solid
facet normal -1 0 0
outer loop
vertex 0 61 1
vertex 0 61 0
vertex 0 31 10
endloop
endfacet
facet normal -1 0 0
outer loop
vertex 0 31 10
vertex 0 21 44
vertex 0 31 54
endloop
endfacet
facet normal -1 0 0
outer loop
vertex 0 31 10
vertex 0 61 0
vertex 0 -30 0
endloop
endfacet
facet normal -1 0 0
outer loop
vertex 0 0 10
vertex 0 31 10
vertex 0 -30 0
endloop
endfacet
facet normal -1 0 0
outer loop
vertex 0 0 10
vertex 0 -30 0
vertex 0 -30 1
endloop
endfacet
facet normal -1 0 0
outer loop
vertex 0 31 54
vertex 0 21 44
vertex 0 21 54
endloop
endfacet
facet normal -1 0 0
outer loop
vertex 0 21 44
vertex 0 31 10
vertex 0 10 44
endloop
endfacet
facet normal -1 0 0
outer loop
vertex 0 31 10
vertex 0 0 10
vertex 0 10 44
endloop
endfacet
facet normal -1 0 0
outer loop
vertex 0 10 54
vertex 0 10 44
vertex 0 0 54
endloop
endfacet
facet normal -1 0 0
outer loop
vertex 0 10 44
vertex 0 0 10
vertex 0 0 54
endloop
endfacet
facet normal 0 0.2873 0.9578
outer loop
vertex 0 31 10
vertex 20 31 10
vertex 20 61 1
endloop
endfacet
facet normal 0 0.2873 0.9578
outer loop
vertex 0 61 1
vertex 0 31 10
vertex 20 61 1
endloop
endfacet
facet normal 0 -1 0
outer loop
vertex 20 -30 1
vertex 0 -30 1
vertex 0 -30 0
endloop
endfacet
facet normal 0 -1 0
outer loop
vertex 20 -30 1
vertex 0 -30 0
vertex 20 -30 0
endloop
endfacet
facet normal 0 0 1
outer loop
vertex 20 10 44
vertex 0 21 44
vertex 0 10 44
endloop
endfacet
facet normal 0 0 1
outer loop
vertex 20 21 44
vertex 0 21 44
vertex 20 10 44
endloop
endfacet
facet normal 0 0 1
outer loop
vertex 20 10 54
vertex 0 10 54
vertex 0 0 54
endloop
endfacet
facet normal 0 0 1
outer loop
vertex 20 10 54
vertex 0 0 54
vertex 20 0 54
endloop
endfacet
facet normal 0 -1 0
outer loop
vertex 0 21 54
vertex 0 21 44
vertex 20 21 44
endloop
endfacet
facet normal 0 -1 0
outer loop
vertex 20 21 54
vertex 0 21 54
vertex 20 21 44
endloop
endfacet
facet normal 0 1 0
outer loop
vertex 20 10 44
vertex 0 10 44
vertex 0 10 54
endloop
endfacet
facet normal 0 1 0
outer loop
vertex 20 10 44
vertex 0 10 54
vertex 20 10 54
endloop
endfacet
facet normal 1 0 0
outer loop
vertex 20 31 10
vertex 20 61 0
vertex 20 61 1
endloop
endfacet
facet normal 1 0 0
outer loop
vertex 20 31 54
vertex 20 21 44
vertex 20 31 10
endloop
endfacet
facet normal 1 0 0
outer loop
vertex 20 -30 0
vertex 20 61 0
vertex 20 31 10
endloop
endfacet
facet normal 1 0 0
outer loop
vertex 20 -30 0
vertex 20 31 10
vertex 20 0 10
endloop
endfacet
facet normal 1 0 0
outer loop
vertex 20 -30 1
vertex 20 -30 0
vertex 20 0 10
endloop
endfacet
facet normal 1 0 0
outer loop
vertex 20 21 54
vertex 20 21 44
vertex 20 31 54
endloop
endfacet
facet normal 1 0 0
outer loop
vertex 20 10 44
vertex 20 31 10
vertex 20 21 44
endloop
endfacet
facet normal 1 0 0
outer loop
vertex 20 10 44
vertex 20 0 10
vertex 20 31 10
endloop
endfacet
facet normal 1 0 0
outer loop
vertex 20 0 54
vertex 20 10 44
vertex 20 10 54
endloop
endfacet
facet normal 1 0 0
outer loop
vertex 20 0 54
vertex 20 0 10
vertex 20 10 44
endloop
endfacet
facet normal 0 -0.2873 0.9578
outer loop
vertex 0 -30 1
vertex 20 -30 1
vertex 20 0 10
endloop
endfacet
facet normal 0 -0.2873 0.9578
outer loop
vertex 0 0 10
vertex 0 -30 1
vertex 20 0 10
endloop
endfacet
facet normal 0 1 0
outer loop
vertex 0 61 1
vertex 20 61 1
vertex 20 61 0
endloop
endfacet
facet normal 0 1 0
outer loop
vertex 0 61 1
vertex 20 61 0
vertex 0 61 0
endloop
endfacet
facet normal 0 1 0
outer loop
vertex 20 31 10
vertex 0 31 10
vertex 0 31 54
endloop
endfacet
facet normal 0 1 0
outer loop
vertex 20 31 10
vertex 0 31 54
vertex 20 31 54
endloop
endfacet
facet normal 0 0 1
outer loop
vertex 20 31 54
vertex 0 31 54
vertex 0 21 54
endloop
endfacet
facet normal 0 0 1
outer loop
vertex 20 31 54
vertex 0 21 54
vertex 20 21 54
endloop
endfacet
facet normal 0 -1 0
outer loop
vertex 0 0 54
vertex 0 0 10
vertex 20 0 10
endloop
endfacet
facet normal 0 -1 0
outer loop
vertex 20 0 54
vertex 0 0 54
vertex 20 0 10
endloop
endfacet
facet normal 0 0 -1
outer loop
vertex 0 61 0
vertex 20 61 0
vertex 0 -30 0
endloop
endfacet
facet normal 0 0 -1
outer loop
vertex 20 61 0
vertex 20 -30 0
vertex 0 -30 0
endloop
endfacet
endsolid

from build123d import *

# Parameters (mm, degrees)
F0_W     = 20
F0_H     = 31
F1_DEPTH = 44
F2_W     = 20
F2_H     = 10
F3_DEPTH = 10
F4_W     = 20
F4_H     = 10
F5_DEPTH = 30
F6_W     = 20
F6_H     = 10
F7_DEPTH = 30
F9_DEPTH = 20


with BuildPart() as f1:
    # F0 (on Top) → F1 (new body)
    with BuildSketch(Plane.XY):
        with Locations((10, 15.5)):
            Rectangle(F0_W, F0_H)
    extrude(amount=F1_DEPTH)

    # F2 (on face) → F3 (join)
    with BuildSketch(Plane.XY.offset(44)):
        with Locations((10, 26)):
            Rectangle(F2_W, F2_H)
        with Locations((10, 5)):
            Rectangle(F2_W, F2_H)
    extrude(amount=F3_DEPTH)

    # F4 (on face) → F5 (join)
    with BuildSketch(Plane.XZ):
        with Locations((10, 5)):
            Rectangle(F4_W, F4_H)
    extrude(amount=F5_DEPTH)

    # F6 (on face) → F7 (join)
    with BuildSketch(Plane(origin=(0, 31, 0), x_dir=(-1, 0, 0), z_dir=(0, 1, 0))):
        with Locations((-10, 5)):
            Rectangle(F6_W, F6_H)
    extrude(amount=F7_DEPTH)

    # F8 (on face) → F9 (cut)
    with BuildSketch(Plane.YZ.offset(20)):
        Polygon((-30, 1), (0, 10), (-30, 10), align=None)
        Polygon((31, 10), (61, 1), (61, 10), align=None)
    extrude(amount=-F9_DEPTH, mode=Mode.SUBTRACT)


solid = f1.part
